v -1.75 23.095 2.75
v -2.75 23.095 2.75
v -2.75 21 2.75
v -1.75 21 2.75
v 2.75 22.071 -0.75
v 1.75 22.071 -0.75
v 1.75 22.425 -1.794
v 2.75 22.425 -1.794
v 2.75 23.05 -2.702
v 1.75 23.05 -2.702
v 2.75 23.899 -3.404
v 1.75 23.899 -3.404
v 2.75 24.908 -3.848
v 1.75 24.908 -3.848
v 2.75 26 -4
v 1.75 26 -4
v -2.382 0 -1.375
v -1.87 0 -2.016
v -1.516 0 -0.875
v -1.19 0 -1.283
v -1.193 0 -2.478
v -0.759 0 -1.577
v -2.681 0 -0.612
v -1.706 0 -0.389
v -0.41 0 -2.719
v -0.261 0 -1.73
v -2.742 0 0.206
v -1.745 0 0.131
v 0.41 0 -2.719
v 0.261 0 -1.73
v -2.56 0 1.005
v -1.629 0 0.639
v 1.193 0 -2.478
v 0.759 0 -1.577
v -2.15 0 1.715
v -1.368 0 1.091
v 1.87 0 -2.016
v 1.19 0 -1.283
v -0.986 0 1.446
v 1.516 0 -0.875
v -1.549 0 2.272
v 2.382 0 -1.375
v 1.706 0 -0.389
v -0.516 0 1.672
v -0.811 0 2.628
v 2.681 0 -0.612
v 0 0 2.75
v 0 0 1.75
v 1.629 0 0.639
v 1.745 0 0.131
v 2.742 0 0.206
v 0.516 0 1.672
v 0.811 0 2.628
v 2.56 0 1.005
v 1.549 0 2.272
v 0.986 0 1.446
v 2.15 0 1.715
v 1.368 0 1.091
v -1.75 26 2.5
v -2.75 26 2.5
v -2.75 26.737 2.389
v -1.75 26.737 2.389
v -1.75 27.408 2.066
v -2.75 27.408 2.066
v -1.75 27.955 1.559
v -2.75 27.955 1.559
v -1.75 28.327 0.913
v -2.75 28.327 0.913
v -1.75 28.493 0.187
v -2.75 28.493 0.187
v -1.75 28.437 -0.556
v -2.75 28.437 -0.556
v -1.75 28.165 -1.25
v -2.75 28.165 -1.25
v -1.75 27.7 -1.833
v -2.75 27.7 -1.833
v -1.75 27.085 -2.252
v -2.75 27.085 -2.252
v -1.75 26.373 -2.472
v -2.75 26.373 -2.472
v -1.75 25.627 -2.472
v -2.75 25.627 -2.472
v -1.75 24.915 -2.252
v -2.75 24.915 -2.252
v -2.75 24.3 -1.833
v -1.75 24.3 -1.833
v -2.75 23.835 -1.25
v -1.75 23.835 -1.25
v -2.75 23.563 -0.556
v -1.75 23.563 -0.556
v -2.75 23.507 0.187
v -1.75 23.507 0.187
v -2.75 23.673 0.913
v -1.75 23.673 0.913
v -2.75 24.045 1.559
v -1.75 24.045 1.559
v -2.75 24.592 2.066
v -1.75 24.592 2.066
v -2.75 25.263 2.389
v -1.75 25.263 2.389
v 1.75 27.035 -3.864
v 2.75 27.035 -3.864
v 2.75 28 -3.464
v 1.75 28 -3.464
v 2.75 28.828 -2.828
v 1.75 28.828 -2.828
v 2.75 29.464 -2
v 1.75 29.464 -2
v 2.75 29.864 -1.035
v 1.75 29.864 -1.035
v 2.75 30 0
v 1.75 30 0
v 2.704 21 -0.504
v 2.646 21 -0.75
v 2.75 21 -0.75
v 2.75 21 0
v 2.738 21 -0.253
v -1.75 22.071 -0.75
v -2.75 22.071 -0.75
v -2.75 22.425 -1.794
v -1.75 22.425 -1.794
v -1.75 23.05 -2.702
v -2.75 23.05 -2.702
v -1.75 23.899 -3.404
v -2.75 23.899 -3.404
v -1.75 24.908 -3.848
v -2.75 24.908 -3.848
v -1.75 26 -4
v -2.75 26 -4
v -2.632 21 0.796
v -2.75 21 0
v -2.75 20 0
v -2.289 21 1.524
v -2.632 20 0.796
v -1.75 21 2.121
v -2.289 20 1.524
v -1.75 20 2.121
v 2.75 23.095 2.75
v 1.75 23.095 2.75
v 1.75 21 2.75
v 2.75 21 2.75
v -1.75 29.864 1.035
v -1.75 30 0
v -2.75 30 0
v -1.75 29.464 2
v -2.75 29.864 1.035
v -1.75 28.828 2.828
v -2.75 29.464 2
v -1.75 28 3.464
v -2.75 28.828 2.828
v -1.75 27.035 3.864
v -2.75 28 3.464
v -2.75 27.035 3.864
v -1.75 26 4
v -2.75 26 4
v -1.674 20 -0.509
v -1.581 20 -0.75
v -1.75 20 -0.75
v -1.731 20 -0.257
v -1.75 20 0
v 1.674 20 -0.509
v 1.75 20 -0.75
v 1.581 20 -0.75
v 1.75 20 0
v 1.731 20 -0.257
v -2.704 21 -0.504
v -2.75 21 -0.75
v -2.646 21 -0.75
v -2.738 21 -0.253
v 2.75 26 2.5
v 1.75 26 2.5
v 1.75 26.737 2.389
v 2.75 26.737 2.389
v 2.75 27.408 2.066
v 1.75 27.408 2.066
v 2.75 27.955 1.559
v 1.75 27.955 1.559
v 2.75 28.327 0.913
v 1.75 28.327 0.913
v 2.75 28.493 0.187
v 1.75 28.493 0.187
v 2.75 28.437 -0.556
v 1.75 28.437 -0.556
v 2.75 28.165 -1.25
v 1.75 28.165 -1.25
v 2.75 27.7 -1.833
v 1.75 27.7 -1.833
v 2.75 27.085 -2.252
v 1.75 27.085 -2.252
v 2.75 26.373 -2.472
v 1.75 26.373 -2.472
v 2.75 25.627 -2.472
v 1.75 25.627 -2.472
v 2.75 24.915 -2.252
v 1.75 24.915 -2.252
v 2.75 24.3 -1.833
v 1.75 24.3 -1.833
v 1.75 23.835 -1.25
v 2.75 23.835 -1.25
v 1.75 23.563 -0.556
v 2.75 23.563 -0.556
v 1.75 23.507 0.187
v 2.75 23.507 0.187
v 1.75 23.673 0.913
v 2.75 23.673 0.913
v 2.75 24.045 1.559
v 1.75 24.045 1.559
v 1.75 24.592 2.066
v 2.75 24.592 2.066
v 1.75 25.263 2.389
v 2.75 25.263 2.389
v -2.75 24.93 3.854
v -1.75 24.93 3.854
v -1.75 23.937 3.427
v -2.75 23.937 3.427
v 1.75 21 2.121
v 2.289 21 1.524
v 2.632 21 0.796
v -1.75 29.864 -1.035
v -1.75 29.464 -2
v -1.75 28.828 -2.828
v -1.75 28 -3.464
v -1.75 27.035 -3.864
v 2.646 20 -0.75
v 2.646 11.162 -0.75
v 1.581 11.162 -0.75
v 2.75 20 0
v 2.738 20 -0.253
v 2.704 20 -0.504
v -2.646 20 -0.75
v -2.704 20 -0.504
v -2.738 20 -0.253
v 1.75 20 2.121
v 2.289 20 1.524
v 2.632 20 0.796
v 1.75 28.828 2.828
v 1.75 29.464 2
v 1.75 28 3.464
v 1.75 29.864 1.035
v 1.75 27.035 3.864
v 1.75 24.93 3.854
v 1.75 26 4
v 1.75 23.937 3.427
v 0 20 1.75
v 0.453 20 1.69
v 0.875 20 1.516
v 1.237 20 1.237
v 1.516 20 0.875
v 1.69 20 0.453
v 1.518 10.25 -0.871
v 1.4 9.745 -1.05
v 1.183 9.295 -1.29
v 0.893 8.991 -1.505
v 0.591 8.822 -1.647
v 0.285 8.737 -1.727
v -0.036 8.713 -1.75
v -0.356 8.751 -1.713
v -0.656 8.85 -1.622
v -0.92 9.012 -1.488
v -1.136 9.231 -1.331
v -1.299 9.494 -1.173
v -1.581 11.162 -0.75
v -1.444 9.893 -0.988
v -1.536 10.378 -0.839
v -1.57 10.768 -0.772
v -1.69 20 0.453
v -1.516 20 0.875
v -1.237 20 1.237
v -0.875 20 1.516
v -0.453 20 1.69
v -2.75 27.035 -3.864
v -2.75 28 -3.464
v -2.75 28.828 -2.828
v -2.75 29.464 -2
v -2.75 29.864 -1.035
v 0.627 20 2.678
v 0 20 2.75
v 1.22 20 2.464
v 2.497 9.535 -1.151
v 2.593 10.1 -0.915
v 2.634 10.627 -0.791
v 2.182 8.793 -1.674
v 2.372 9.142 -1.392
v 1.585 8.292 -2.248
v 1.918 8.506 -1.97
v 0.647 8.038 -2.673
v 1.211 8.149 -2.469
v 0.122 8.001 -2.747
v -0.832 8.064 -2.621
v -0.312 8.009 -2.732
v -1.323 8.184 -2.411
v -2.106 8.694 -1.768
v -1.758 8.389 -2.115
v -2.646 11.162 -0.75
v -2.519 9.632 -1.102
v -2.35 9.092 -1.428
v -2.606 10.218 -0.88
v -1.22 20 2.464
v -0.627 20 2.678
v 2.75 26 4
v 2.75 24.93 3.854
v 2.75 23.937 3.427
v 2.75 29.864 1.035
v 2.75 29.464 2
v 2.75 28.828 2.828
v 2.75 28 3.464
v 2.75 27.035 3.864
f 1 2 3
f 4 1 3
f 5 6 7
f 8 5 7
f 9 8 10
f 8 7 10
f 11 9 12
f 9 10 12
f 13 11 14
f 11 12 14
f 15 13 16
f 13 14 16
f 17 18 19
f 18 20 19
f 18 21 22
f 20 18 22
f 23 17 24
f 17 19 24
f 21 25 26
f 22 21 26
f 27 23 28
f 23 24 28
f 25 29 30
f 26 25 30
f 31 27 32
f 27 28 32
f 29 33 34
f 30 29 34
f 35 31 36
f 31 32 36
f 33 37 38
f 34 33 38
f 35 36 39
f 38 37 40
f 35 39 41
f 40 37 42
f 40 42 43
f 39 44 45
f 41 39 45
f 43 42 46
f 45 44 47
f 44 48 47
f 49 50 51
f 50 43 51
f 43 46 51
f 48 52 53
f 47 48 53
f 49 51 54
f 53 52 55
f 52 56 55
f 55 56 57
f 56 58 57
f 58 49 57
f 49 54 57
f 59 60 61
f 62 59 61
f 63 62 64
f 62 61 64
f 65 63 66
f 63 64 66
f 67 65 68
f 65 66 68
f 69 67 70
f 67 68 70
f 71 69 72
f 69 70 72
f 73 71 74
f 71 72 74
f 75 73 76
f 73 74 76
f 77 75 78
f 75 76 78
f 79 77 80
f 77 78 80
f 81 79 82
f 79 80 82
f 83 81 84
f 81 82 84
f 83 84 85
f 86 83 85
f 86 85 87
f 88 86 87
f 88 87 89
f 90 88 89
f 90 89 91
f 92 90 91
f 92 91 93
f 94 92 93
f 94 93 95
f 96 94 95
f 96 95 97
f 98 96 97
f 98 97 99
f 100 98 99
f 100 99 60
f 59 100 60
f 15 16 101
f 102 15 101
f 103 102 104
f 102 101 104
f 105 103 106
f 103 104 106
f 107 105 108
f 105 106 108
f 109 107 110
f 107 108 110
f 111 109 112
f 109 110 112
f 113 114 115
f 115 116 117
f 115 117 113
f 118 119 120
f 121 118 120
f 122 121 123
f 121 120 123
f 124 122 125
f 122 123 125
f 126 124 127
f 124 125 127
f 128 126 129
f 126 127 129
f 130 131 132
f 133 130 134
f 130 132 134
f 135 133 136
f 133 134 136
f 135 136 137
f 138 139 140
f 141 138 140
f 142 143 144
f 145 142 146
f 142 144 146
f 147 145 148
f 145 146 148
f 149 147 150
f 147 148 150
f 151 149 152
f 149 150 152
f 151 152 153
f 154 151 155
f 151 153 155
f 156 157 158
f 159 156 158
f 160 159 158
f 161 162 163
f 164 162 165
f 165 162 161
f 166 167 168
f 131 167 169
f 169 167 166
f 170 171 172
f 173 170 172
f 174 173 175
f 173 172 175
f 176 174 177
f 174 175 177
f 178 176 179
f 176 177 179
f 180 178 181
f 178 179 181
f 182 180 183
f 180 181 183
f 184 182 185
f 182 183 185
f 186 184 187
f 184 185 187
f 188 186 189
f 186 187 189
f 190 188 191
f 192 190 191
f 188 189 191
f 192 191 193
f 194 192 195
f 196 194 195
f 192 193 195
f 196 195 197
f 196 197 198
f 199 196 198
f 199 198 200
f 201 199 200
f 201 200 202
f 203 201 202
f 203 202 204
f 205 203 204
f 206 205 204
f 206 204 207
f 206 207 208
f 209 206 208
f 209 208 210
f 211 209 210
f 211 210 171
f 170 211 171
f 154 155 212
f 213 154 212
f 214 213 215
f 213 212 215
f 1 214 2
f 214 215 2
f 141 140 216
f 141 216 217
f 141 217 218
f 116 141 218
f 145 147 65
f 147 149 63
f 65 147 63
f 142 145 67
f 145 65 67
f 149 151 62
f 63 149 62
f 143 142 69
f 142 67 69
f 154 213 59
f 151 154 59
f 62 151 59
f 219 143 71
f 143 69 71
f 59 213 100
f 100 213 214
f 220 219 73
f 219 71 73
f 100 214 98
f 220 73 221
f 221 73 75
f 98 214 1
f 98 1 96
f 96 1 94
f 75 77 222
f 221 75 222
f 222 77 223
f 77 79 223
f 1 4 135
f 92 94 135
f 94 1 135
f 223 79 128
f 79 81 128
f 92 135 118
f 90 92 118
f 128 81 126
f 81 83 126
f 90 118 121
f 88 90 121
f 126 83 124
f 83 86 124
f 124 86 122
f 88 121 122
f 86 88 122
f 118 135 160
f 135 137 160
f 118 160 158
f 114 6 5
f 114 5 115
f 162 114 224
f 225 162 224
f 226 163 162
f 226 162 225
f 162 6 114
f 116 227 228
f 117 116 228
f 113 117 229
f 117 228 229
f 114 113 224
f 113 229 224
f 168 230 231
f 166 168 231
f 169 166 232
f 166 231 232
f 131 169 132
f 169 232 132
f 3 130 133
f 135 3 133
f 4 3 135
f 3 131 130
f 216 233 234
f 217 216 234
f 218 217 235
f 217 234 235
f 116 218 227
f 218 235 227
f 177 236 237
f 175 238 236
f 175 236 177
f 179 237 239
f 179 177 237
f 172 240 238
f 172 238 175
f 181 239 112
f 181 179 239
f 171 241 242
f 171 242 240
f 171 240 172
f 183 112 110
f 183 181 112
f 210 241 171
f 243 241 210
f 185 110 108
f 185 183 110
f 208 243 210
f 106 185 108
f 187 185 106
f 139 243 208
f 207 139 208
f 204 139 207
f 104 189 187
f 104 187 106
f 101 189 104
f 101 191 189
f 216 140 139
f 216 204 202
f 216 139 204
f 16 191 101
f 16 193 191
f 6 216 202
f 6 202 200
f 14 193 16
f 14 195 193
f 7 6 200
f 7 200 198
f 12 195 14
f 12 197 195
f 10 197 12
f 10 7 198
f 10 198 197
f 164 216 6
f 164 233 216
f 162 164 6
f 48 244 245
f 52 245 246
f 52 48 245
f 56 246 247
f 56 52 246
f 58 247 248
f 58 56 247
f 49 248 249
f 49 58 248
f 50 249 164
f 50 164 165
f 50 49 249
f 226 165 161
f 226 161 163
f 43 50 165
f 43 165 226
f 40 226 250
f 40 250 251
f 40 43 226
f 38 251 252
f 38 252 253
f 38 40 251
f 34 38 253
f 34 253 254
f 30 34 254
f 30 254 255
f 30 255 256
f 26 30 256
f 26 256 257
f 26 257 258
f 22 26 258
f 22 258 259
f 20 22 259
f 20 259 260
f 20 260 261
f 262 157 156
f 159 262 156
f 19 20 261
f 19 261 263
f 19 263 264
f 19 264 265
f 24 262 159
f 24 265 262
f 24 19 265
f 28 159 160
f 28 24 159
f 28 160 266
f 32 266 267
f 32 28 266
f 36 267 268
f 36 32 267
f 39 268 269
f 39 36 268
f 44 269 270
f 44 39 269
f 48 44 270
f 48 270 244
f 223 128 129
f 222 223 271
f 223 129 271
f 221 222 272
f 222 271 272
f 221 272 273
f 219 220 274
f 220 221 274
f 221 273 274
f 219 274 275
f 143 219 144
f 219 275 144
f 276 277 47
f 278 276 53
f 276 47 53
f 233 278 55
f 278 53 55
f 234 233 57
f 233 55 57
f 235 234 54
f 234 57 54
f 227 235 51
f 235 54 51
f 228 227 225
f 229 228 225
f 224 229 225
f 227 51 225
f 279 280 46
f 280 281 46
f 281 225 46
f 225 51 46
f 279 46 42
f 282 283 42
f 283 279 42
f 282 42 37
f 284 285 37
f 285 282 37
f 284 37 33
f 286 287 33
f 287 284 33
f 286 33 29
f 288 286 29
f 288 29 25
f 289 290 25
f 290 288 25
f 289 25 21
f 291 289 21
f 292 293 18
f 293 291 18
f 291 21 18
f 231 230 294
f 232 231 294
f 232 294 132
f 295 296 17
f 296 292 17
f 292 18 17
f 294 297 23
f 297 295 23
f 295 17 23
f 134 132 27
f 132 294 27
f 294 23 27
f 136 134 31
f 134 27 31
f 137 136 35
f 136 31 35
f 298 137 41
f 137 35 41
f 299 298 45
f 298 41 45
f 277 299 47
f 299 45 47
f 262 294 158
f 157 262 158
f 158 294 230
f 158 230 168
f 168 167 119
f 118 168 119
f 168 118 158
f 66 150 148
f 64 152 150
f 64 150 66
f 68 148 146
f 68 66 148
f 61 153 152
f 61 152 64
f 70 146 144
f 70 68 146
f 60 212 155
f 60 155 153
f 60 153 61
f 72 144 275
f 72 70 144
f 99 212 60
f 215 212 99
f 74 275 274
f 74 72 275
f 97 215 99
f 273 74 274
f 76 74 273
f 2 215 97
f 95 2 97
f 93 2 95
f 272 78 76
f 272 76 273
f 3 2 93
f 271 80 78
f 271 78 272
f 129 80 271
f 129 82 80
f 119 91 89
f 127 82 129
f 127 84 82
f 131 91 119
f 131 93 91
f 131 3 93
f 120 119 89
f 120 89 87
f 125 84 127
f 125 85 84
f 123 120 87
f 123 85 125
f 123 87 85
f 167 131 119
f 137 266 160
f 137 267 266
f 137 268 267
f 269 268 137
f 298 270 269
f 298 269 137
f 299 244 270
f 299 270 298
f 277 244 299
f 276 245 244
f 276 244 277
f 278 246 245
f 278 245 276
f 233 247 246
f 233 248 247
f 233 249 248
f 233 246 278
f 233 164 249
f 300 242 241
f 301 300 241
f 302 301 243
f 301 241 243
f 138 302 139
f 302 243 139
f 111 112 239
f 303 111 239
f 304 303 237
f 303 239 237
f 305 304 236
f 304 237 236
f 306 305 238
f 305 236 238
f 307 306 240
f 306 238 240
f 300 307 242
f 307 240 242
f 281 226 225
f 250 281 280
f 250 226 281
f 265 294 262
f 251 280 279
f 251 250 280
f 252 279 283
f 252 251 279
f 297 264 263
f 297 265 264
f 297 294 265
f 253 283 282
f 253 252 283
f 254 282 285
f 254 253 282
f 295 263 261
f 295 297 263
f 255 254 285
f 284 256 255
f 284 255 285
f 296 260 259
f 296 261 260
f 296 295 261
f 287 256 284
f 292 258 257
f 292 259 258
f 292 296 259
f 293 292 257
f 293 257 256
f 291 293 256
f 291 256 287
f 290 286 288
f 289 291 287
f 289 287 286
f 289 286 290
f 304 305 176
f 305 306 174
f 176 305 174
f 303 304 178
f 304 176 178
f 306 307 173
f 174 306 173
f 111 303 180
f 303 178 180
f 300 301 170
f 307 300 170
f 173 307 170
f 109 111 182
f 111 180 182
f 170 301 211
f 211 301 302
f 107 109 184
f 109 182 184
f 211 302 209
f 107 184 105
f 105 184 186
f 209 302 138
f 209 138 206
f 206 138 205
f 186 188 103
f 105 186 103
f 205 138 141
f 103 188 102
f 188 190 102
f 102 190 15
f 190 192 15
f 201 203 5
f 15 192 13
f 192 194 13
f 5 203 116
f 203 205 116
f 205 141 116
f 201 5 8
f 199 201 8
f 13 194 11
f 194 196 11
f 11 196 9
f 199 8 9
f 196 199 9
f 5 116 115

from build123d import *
from build123d.topology import SkipClean

# Parameters (mm, degrees)
SKETCH_1_R               = 2.75
SKETCH_1_R_2             = 1.75
EXTRUDE_1_DEPTH          = 20
CUT_EXTRUDE_2_DEPTH      = 21.374616561
CUT_EXTRUDE_2_DEPTH_BACK = 21.374616561
SKETCH_3_W               = 1
SKETCH_3_H               = 8
EXTRUDE_3_DEPTH          = 10
SKETCH_4_R               = 2.5
CUT_EXTRUDE_5_DEPTH      = 31.761176848
CUT_EXTRUDE_8_DEPTH      = 1


with BuildPart() as part:
    # 草圖1 → 伸長1 (new body)
    with BuildSketch(Plane(origin=(0, 0, 0), x_dir=(1, 0, 0), z_dir=(0, 1, 0))):
        with Locations(Location((0, 0, 0), (0, 0, 270))):
            Circle(SKETCH_1_R)
        with Locations(Location((0, 0, 0), (0, 0, 270))):
            Circle(SKETCH_1_R_2, mode=Mode.SUBTRACT)
    extrude(amount=EXTRUDE_1_DEPTH)

    # 草圖2 → 伸長2 (cut, two sides: drawn at the far end of the back side and taken through both)
    with BuildSketch(Plane(origin=(0, 0, 0), x_dir=(0, 0, -1), z_dir=(1, 0, 0)).offset(-CUT_EXTRUDE_2_DEPTH_BACK)):
        with BuildLine():
            Line((0.75, 20), (0.75, 11.16227766))
            ThreePointArc((0.75, 11.16227766), (1.291960108, 9.291448967), (2.75, 8))
            Line((2.75, 8), (2.75, 20))
            Line((2.75, 20), (0.75, 20))
        make_face()
    extrude(amount=CUT_EXTRUDE_2_DEPTH + CUT_EXTRUDE_2_DEPTH_BACK, mode=Mode.SUBTRACT)

    # 草圖3 → 伸長3 (add)
    with BuildSketch(Plane(origin=(0, 20, 0), x_dir=(1, 0, 0), z_dir=(0, 1, 0))):
        with Locations((-2.25, 0)):
            Rectangle(SKETCH_3_W, SKETCH_3_H)
        with Locations((2.25, 0)):
            Rectangle(SKETCH_3_W, SKETCH_3_H)
    extrude(amount=EXTRUDE_3_DEPTH)

    # 草圖4 → 伸長5 (cut, through all)
    with BuildSketch(Plane.ZY.offset(2.75)):
        with BuildLine():
            Line((-4, 20), (-0.75, 20))
            Line((-0.75, 20), (-0.75, 22.070941589))
            ThreePointArc((-0.75, 22.070941589), (-3.082207, 23.450490242), (-4, 25.999999996))
            Line((-4, 25.999999996), (-4, 20))
        make_face()
        with BuildLine():
            Line((4, 20), (4, 26))
            ThreePointArc((4, 26), (3.674234614, 24.41886117), (2.75, 23.09526249))
            Line((2.75, 23.09526249), (2.75, 20))
            Line((2.75, 20), (4, 20))
        make_face()
        with BuildLine():
            Line((4, 30), (0, 30))
            ThreePointArc((0, 30), (2.828427125, 28.828427125), (4, 26))
            Line((4, 26), (4, 30))
        make_face()
        with BuildLine():
            Line((-4, 30), (-4, 25.999999996))
            ThreePointArc((-4, 25.999999996), (-2.828427126, 28.828427123), (0, 30))
            Line((0, 30), (-4, 30))
        make_face()
        with Locations((0, 26)):
            Circle(SKETCH_4_R)
    extrude(amount=-CUT_EXTRUDE_5_DEPTH, mode=Mode.SUBTRACT)

    # 草圖10 → 伸長8 (cut)
    with SkipClean():  # the faces are left unmerged after this step: merging them gives an invalid solid
        with BuildSketch(Plane.XZ.offset(-20)):
            with BuildLine():
                Line((0, 2.75), (-2.75, 2.75))
                Line((-2.75, 2.75), (-2.75, 0))
                ThreePointArc((-2.75, 0), (-1.944543648, 1.944543648), (0, 2.75))
            make_face()
            with BuildLine():
                Line((2.75, 0), (2.75, 2.75))
                Line((2.75, 2.75), (1.75, 2.75))
                Line((1.75, 2.75), (1.75, 2.121320344))
                ThreePointArc((1.75, 2.121320344), (2.487468593, 1.17260394), (2.75, 0))
            make_face()
            with BuildLine():
                Line((1.75, 2.75), (0, 2.75))
                ThreePointArc((0, 2.75), (0.929749712, 2.588062108), (1.75, 2.121320344))
                Line((1.75, 2.121320344), (1.75, 2.75))
            make_face()
            with BuildLine():
                ThreePointArc((-2.645751311, -0.75), (-2.723813146, -0.378605266), (-2.75, 0))
                Line((-2.75, 0), (-2.75, -0.75))
                Line((-2.75, -0.75), (-2.645751311, -0.75))
            make_face()
            with BuildLine():
                Line((2.75, -0.75), (2.75, 0))
                ThreePointArc((2.75, 0), (2.723813146, -0.378605266), (2.645751311, -0.75))
                Line((2.645751311, -0.75), (2.75, -0.75))
            make_face()
        extrude(amount=-CUT_EXTRUDE_8_DEPTH, mode=Mode.SUBTRACT)


solid = part.part
